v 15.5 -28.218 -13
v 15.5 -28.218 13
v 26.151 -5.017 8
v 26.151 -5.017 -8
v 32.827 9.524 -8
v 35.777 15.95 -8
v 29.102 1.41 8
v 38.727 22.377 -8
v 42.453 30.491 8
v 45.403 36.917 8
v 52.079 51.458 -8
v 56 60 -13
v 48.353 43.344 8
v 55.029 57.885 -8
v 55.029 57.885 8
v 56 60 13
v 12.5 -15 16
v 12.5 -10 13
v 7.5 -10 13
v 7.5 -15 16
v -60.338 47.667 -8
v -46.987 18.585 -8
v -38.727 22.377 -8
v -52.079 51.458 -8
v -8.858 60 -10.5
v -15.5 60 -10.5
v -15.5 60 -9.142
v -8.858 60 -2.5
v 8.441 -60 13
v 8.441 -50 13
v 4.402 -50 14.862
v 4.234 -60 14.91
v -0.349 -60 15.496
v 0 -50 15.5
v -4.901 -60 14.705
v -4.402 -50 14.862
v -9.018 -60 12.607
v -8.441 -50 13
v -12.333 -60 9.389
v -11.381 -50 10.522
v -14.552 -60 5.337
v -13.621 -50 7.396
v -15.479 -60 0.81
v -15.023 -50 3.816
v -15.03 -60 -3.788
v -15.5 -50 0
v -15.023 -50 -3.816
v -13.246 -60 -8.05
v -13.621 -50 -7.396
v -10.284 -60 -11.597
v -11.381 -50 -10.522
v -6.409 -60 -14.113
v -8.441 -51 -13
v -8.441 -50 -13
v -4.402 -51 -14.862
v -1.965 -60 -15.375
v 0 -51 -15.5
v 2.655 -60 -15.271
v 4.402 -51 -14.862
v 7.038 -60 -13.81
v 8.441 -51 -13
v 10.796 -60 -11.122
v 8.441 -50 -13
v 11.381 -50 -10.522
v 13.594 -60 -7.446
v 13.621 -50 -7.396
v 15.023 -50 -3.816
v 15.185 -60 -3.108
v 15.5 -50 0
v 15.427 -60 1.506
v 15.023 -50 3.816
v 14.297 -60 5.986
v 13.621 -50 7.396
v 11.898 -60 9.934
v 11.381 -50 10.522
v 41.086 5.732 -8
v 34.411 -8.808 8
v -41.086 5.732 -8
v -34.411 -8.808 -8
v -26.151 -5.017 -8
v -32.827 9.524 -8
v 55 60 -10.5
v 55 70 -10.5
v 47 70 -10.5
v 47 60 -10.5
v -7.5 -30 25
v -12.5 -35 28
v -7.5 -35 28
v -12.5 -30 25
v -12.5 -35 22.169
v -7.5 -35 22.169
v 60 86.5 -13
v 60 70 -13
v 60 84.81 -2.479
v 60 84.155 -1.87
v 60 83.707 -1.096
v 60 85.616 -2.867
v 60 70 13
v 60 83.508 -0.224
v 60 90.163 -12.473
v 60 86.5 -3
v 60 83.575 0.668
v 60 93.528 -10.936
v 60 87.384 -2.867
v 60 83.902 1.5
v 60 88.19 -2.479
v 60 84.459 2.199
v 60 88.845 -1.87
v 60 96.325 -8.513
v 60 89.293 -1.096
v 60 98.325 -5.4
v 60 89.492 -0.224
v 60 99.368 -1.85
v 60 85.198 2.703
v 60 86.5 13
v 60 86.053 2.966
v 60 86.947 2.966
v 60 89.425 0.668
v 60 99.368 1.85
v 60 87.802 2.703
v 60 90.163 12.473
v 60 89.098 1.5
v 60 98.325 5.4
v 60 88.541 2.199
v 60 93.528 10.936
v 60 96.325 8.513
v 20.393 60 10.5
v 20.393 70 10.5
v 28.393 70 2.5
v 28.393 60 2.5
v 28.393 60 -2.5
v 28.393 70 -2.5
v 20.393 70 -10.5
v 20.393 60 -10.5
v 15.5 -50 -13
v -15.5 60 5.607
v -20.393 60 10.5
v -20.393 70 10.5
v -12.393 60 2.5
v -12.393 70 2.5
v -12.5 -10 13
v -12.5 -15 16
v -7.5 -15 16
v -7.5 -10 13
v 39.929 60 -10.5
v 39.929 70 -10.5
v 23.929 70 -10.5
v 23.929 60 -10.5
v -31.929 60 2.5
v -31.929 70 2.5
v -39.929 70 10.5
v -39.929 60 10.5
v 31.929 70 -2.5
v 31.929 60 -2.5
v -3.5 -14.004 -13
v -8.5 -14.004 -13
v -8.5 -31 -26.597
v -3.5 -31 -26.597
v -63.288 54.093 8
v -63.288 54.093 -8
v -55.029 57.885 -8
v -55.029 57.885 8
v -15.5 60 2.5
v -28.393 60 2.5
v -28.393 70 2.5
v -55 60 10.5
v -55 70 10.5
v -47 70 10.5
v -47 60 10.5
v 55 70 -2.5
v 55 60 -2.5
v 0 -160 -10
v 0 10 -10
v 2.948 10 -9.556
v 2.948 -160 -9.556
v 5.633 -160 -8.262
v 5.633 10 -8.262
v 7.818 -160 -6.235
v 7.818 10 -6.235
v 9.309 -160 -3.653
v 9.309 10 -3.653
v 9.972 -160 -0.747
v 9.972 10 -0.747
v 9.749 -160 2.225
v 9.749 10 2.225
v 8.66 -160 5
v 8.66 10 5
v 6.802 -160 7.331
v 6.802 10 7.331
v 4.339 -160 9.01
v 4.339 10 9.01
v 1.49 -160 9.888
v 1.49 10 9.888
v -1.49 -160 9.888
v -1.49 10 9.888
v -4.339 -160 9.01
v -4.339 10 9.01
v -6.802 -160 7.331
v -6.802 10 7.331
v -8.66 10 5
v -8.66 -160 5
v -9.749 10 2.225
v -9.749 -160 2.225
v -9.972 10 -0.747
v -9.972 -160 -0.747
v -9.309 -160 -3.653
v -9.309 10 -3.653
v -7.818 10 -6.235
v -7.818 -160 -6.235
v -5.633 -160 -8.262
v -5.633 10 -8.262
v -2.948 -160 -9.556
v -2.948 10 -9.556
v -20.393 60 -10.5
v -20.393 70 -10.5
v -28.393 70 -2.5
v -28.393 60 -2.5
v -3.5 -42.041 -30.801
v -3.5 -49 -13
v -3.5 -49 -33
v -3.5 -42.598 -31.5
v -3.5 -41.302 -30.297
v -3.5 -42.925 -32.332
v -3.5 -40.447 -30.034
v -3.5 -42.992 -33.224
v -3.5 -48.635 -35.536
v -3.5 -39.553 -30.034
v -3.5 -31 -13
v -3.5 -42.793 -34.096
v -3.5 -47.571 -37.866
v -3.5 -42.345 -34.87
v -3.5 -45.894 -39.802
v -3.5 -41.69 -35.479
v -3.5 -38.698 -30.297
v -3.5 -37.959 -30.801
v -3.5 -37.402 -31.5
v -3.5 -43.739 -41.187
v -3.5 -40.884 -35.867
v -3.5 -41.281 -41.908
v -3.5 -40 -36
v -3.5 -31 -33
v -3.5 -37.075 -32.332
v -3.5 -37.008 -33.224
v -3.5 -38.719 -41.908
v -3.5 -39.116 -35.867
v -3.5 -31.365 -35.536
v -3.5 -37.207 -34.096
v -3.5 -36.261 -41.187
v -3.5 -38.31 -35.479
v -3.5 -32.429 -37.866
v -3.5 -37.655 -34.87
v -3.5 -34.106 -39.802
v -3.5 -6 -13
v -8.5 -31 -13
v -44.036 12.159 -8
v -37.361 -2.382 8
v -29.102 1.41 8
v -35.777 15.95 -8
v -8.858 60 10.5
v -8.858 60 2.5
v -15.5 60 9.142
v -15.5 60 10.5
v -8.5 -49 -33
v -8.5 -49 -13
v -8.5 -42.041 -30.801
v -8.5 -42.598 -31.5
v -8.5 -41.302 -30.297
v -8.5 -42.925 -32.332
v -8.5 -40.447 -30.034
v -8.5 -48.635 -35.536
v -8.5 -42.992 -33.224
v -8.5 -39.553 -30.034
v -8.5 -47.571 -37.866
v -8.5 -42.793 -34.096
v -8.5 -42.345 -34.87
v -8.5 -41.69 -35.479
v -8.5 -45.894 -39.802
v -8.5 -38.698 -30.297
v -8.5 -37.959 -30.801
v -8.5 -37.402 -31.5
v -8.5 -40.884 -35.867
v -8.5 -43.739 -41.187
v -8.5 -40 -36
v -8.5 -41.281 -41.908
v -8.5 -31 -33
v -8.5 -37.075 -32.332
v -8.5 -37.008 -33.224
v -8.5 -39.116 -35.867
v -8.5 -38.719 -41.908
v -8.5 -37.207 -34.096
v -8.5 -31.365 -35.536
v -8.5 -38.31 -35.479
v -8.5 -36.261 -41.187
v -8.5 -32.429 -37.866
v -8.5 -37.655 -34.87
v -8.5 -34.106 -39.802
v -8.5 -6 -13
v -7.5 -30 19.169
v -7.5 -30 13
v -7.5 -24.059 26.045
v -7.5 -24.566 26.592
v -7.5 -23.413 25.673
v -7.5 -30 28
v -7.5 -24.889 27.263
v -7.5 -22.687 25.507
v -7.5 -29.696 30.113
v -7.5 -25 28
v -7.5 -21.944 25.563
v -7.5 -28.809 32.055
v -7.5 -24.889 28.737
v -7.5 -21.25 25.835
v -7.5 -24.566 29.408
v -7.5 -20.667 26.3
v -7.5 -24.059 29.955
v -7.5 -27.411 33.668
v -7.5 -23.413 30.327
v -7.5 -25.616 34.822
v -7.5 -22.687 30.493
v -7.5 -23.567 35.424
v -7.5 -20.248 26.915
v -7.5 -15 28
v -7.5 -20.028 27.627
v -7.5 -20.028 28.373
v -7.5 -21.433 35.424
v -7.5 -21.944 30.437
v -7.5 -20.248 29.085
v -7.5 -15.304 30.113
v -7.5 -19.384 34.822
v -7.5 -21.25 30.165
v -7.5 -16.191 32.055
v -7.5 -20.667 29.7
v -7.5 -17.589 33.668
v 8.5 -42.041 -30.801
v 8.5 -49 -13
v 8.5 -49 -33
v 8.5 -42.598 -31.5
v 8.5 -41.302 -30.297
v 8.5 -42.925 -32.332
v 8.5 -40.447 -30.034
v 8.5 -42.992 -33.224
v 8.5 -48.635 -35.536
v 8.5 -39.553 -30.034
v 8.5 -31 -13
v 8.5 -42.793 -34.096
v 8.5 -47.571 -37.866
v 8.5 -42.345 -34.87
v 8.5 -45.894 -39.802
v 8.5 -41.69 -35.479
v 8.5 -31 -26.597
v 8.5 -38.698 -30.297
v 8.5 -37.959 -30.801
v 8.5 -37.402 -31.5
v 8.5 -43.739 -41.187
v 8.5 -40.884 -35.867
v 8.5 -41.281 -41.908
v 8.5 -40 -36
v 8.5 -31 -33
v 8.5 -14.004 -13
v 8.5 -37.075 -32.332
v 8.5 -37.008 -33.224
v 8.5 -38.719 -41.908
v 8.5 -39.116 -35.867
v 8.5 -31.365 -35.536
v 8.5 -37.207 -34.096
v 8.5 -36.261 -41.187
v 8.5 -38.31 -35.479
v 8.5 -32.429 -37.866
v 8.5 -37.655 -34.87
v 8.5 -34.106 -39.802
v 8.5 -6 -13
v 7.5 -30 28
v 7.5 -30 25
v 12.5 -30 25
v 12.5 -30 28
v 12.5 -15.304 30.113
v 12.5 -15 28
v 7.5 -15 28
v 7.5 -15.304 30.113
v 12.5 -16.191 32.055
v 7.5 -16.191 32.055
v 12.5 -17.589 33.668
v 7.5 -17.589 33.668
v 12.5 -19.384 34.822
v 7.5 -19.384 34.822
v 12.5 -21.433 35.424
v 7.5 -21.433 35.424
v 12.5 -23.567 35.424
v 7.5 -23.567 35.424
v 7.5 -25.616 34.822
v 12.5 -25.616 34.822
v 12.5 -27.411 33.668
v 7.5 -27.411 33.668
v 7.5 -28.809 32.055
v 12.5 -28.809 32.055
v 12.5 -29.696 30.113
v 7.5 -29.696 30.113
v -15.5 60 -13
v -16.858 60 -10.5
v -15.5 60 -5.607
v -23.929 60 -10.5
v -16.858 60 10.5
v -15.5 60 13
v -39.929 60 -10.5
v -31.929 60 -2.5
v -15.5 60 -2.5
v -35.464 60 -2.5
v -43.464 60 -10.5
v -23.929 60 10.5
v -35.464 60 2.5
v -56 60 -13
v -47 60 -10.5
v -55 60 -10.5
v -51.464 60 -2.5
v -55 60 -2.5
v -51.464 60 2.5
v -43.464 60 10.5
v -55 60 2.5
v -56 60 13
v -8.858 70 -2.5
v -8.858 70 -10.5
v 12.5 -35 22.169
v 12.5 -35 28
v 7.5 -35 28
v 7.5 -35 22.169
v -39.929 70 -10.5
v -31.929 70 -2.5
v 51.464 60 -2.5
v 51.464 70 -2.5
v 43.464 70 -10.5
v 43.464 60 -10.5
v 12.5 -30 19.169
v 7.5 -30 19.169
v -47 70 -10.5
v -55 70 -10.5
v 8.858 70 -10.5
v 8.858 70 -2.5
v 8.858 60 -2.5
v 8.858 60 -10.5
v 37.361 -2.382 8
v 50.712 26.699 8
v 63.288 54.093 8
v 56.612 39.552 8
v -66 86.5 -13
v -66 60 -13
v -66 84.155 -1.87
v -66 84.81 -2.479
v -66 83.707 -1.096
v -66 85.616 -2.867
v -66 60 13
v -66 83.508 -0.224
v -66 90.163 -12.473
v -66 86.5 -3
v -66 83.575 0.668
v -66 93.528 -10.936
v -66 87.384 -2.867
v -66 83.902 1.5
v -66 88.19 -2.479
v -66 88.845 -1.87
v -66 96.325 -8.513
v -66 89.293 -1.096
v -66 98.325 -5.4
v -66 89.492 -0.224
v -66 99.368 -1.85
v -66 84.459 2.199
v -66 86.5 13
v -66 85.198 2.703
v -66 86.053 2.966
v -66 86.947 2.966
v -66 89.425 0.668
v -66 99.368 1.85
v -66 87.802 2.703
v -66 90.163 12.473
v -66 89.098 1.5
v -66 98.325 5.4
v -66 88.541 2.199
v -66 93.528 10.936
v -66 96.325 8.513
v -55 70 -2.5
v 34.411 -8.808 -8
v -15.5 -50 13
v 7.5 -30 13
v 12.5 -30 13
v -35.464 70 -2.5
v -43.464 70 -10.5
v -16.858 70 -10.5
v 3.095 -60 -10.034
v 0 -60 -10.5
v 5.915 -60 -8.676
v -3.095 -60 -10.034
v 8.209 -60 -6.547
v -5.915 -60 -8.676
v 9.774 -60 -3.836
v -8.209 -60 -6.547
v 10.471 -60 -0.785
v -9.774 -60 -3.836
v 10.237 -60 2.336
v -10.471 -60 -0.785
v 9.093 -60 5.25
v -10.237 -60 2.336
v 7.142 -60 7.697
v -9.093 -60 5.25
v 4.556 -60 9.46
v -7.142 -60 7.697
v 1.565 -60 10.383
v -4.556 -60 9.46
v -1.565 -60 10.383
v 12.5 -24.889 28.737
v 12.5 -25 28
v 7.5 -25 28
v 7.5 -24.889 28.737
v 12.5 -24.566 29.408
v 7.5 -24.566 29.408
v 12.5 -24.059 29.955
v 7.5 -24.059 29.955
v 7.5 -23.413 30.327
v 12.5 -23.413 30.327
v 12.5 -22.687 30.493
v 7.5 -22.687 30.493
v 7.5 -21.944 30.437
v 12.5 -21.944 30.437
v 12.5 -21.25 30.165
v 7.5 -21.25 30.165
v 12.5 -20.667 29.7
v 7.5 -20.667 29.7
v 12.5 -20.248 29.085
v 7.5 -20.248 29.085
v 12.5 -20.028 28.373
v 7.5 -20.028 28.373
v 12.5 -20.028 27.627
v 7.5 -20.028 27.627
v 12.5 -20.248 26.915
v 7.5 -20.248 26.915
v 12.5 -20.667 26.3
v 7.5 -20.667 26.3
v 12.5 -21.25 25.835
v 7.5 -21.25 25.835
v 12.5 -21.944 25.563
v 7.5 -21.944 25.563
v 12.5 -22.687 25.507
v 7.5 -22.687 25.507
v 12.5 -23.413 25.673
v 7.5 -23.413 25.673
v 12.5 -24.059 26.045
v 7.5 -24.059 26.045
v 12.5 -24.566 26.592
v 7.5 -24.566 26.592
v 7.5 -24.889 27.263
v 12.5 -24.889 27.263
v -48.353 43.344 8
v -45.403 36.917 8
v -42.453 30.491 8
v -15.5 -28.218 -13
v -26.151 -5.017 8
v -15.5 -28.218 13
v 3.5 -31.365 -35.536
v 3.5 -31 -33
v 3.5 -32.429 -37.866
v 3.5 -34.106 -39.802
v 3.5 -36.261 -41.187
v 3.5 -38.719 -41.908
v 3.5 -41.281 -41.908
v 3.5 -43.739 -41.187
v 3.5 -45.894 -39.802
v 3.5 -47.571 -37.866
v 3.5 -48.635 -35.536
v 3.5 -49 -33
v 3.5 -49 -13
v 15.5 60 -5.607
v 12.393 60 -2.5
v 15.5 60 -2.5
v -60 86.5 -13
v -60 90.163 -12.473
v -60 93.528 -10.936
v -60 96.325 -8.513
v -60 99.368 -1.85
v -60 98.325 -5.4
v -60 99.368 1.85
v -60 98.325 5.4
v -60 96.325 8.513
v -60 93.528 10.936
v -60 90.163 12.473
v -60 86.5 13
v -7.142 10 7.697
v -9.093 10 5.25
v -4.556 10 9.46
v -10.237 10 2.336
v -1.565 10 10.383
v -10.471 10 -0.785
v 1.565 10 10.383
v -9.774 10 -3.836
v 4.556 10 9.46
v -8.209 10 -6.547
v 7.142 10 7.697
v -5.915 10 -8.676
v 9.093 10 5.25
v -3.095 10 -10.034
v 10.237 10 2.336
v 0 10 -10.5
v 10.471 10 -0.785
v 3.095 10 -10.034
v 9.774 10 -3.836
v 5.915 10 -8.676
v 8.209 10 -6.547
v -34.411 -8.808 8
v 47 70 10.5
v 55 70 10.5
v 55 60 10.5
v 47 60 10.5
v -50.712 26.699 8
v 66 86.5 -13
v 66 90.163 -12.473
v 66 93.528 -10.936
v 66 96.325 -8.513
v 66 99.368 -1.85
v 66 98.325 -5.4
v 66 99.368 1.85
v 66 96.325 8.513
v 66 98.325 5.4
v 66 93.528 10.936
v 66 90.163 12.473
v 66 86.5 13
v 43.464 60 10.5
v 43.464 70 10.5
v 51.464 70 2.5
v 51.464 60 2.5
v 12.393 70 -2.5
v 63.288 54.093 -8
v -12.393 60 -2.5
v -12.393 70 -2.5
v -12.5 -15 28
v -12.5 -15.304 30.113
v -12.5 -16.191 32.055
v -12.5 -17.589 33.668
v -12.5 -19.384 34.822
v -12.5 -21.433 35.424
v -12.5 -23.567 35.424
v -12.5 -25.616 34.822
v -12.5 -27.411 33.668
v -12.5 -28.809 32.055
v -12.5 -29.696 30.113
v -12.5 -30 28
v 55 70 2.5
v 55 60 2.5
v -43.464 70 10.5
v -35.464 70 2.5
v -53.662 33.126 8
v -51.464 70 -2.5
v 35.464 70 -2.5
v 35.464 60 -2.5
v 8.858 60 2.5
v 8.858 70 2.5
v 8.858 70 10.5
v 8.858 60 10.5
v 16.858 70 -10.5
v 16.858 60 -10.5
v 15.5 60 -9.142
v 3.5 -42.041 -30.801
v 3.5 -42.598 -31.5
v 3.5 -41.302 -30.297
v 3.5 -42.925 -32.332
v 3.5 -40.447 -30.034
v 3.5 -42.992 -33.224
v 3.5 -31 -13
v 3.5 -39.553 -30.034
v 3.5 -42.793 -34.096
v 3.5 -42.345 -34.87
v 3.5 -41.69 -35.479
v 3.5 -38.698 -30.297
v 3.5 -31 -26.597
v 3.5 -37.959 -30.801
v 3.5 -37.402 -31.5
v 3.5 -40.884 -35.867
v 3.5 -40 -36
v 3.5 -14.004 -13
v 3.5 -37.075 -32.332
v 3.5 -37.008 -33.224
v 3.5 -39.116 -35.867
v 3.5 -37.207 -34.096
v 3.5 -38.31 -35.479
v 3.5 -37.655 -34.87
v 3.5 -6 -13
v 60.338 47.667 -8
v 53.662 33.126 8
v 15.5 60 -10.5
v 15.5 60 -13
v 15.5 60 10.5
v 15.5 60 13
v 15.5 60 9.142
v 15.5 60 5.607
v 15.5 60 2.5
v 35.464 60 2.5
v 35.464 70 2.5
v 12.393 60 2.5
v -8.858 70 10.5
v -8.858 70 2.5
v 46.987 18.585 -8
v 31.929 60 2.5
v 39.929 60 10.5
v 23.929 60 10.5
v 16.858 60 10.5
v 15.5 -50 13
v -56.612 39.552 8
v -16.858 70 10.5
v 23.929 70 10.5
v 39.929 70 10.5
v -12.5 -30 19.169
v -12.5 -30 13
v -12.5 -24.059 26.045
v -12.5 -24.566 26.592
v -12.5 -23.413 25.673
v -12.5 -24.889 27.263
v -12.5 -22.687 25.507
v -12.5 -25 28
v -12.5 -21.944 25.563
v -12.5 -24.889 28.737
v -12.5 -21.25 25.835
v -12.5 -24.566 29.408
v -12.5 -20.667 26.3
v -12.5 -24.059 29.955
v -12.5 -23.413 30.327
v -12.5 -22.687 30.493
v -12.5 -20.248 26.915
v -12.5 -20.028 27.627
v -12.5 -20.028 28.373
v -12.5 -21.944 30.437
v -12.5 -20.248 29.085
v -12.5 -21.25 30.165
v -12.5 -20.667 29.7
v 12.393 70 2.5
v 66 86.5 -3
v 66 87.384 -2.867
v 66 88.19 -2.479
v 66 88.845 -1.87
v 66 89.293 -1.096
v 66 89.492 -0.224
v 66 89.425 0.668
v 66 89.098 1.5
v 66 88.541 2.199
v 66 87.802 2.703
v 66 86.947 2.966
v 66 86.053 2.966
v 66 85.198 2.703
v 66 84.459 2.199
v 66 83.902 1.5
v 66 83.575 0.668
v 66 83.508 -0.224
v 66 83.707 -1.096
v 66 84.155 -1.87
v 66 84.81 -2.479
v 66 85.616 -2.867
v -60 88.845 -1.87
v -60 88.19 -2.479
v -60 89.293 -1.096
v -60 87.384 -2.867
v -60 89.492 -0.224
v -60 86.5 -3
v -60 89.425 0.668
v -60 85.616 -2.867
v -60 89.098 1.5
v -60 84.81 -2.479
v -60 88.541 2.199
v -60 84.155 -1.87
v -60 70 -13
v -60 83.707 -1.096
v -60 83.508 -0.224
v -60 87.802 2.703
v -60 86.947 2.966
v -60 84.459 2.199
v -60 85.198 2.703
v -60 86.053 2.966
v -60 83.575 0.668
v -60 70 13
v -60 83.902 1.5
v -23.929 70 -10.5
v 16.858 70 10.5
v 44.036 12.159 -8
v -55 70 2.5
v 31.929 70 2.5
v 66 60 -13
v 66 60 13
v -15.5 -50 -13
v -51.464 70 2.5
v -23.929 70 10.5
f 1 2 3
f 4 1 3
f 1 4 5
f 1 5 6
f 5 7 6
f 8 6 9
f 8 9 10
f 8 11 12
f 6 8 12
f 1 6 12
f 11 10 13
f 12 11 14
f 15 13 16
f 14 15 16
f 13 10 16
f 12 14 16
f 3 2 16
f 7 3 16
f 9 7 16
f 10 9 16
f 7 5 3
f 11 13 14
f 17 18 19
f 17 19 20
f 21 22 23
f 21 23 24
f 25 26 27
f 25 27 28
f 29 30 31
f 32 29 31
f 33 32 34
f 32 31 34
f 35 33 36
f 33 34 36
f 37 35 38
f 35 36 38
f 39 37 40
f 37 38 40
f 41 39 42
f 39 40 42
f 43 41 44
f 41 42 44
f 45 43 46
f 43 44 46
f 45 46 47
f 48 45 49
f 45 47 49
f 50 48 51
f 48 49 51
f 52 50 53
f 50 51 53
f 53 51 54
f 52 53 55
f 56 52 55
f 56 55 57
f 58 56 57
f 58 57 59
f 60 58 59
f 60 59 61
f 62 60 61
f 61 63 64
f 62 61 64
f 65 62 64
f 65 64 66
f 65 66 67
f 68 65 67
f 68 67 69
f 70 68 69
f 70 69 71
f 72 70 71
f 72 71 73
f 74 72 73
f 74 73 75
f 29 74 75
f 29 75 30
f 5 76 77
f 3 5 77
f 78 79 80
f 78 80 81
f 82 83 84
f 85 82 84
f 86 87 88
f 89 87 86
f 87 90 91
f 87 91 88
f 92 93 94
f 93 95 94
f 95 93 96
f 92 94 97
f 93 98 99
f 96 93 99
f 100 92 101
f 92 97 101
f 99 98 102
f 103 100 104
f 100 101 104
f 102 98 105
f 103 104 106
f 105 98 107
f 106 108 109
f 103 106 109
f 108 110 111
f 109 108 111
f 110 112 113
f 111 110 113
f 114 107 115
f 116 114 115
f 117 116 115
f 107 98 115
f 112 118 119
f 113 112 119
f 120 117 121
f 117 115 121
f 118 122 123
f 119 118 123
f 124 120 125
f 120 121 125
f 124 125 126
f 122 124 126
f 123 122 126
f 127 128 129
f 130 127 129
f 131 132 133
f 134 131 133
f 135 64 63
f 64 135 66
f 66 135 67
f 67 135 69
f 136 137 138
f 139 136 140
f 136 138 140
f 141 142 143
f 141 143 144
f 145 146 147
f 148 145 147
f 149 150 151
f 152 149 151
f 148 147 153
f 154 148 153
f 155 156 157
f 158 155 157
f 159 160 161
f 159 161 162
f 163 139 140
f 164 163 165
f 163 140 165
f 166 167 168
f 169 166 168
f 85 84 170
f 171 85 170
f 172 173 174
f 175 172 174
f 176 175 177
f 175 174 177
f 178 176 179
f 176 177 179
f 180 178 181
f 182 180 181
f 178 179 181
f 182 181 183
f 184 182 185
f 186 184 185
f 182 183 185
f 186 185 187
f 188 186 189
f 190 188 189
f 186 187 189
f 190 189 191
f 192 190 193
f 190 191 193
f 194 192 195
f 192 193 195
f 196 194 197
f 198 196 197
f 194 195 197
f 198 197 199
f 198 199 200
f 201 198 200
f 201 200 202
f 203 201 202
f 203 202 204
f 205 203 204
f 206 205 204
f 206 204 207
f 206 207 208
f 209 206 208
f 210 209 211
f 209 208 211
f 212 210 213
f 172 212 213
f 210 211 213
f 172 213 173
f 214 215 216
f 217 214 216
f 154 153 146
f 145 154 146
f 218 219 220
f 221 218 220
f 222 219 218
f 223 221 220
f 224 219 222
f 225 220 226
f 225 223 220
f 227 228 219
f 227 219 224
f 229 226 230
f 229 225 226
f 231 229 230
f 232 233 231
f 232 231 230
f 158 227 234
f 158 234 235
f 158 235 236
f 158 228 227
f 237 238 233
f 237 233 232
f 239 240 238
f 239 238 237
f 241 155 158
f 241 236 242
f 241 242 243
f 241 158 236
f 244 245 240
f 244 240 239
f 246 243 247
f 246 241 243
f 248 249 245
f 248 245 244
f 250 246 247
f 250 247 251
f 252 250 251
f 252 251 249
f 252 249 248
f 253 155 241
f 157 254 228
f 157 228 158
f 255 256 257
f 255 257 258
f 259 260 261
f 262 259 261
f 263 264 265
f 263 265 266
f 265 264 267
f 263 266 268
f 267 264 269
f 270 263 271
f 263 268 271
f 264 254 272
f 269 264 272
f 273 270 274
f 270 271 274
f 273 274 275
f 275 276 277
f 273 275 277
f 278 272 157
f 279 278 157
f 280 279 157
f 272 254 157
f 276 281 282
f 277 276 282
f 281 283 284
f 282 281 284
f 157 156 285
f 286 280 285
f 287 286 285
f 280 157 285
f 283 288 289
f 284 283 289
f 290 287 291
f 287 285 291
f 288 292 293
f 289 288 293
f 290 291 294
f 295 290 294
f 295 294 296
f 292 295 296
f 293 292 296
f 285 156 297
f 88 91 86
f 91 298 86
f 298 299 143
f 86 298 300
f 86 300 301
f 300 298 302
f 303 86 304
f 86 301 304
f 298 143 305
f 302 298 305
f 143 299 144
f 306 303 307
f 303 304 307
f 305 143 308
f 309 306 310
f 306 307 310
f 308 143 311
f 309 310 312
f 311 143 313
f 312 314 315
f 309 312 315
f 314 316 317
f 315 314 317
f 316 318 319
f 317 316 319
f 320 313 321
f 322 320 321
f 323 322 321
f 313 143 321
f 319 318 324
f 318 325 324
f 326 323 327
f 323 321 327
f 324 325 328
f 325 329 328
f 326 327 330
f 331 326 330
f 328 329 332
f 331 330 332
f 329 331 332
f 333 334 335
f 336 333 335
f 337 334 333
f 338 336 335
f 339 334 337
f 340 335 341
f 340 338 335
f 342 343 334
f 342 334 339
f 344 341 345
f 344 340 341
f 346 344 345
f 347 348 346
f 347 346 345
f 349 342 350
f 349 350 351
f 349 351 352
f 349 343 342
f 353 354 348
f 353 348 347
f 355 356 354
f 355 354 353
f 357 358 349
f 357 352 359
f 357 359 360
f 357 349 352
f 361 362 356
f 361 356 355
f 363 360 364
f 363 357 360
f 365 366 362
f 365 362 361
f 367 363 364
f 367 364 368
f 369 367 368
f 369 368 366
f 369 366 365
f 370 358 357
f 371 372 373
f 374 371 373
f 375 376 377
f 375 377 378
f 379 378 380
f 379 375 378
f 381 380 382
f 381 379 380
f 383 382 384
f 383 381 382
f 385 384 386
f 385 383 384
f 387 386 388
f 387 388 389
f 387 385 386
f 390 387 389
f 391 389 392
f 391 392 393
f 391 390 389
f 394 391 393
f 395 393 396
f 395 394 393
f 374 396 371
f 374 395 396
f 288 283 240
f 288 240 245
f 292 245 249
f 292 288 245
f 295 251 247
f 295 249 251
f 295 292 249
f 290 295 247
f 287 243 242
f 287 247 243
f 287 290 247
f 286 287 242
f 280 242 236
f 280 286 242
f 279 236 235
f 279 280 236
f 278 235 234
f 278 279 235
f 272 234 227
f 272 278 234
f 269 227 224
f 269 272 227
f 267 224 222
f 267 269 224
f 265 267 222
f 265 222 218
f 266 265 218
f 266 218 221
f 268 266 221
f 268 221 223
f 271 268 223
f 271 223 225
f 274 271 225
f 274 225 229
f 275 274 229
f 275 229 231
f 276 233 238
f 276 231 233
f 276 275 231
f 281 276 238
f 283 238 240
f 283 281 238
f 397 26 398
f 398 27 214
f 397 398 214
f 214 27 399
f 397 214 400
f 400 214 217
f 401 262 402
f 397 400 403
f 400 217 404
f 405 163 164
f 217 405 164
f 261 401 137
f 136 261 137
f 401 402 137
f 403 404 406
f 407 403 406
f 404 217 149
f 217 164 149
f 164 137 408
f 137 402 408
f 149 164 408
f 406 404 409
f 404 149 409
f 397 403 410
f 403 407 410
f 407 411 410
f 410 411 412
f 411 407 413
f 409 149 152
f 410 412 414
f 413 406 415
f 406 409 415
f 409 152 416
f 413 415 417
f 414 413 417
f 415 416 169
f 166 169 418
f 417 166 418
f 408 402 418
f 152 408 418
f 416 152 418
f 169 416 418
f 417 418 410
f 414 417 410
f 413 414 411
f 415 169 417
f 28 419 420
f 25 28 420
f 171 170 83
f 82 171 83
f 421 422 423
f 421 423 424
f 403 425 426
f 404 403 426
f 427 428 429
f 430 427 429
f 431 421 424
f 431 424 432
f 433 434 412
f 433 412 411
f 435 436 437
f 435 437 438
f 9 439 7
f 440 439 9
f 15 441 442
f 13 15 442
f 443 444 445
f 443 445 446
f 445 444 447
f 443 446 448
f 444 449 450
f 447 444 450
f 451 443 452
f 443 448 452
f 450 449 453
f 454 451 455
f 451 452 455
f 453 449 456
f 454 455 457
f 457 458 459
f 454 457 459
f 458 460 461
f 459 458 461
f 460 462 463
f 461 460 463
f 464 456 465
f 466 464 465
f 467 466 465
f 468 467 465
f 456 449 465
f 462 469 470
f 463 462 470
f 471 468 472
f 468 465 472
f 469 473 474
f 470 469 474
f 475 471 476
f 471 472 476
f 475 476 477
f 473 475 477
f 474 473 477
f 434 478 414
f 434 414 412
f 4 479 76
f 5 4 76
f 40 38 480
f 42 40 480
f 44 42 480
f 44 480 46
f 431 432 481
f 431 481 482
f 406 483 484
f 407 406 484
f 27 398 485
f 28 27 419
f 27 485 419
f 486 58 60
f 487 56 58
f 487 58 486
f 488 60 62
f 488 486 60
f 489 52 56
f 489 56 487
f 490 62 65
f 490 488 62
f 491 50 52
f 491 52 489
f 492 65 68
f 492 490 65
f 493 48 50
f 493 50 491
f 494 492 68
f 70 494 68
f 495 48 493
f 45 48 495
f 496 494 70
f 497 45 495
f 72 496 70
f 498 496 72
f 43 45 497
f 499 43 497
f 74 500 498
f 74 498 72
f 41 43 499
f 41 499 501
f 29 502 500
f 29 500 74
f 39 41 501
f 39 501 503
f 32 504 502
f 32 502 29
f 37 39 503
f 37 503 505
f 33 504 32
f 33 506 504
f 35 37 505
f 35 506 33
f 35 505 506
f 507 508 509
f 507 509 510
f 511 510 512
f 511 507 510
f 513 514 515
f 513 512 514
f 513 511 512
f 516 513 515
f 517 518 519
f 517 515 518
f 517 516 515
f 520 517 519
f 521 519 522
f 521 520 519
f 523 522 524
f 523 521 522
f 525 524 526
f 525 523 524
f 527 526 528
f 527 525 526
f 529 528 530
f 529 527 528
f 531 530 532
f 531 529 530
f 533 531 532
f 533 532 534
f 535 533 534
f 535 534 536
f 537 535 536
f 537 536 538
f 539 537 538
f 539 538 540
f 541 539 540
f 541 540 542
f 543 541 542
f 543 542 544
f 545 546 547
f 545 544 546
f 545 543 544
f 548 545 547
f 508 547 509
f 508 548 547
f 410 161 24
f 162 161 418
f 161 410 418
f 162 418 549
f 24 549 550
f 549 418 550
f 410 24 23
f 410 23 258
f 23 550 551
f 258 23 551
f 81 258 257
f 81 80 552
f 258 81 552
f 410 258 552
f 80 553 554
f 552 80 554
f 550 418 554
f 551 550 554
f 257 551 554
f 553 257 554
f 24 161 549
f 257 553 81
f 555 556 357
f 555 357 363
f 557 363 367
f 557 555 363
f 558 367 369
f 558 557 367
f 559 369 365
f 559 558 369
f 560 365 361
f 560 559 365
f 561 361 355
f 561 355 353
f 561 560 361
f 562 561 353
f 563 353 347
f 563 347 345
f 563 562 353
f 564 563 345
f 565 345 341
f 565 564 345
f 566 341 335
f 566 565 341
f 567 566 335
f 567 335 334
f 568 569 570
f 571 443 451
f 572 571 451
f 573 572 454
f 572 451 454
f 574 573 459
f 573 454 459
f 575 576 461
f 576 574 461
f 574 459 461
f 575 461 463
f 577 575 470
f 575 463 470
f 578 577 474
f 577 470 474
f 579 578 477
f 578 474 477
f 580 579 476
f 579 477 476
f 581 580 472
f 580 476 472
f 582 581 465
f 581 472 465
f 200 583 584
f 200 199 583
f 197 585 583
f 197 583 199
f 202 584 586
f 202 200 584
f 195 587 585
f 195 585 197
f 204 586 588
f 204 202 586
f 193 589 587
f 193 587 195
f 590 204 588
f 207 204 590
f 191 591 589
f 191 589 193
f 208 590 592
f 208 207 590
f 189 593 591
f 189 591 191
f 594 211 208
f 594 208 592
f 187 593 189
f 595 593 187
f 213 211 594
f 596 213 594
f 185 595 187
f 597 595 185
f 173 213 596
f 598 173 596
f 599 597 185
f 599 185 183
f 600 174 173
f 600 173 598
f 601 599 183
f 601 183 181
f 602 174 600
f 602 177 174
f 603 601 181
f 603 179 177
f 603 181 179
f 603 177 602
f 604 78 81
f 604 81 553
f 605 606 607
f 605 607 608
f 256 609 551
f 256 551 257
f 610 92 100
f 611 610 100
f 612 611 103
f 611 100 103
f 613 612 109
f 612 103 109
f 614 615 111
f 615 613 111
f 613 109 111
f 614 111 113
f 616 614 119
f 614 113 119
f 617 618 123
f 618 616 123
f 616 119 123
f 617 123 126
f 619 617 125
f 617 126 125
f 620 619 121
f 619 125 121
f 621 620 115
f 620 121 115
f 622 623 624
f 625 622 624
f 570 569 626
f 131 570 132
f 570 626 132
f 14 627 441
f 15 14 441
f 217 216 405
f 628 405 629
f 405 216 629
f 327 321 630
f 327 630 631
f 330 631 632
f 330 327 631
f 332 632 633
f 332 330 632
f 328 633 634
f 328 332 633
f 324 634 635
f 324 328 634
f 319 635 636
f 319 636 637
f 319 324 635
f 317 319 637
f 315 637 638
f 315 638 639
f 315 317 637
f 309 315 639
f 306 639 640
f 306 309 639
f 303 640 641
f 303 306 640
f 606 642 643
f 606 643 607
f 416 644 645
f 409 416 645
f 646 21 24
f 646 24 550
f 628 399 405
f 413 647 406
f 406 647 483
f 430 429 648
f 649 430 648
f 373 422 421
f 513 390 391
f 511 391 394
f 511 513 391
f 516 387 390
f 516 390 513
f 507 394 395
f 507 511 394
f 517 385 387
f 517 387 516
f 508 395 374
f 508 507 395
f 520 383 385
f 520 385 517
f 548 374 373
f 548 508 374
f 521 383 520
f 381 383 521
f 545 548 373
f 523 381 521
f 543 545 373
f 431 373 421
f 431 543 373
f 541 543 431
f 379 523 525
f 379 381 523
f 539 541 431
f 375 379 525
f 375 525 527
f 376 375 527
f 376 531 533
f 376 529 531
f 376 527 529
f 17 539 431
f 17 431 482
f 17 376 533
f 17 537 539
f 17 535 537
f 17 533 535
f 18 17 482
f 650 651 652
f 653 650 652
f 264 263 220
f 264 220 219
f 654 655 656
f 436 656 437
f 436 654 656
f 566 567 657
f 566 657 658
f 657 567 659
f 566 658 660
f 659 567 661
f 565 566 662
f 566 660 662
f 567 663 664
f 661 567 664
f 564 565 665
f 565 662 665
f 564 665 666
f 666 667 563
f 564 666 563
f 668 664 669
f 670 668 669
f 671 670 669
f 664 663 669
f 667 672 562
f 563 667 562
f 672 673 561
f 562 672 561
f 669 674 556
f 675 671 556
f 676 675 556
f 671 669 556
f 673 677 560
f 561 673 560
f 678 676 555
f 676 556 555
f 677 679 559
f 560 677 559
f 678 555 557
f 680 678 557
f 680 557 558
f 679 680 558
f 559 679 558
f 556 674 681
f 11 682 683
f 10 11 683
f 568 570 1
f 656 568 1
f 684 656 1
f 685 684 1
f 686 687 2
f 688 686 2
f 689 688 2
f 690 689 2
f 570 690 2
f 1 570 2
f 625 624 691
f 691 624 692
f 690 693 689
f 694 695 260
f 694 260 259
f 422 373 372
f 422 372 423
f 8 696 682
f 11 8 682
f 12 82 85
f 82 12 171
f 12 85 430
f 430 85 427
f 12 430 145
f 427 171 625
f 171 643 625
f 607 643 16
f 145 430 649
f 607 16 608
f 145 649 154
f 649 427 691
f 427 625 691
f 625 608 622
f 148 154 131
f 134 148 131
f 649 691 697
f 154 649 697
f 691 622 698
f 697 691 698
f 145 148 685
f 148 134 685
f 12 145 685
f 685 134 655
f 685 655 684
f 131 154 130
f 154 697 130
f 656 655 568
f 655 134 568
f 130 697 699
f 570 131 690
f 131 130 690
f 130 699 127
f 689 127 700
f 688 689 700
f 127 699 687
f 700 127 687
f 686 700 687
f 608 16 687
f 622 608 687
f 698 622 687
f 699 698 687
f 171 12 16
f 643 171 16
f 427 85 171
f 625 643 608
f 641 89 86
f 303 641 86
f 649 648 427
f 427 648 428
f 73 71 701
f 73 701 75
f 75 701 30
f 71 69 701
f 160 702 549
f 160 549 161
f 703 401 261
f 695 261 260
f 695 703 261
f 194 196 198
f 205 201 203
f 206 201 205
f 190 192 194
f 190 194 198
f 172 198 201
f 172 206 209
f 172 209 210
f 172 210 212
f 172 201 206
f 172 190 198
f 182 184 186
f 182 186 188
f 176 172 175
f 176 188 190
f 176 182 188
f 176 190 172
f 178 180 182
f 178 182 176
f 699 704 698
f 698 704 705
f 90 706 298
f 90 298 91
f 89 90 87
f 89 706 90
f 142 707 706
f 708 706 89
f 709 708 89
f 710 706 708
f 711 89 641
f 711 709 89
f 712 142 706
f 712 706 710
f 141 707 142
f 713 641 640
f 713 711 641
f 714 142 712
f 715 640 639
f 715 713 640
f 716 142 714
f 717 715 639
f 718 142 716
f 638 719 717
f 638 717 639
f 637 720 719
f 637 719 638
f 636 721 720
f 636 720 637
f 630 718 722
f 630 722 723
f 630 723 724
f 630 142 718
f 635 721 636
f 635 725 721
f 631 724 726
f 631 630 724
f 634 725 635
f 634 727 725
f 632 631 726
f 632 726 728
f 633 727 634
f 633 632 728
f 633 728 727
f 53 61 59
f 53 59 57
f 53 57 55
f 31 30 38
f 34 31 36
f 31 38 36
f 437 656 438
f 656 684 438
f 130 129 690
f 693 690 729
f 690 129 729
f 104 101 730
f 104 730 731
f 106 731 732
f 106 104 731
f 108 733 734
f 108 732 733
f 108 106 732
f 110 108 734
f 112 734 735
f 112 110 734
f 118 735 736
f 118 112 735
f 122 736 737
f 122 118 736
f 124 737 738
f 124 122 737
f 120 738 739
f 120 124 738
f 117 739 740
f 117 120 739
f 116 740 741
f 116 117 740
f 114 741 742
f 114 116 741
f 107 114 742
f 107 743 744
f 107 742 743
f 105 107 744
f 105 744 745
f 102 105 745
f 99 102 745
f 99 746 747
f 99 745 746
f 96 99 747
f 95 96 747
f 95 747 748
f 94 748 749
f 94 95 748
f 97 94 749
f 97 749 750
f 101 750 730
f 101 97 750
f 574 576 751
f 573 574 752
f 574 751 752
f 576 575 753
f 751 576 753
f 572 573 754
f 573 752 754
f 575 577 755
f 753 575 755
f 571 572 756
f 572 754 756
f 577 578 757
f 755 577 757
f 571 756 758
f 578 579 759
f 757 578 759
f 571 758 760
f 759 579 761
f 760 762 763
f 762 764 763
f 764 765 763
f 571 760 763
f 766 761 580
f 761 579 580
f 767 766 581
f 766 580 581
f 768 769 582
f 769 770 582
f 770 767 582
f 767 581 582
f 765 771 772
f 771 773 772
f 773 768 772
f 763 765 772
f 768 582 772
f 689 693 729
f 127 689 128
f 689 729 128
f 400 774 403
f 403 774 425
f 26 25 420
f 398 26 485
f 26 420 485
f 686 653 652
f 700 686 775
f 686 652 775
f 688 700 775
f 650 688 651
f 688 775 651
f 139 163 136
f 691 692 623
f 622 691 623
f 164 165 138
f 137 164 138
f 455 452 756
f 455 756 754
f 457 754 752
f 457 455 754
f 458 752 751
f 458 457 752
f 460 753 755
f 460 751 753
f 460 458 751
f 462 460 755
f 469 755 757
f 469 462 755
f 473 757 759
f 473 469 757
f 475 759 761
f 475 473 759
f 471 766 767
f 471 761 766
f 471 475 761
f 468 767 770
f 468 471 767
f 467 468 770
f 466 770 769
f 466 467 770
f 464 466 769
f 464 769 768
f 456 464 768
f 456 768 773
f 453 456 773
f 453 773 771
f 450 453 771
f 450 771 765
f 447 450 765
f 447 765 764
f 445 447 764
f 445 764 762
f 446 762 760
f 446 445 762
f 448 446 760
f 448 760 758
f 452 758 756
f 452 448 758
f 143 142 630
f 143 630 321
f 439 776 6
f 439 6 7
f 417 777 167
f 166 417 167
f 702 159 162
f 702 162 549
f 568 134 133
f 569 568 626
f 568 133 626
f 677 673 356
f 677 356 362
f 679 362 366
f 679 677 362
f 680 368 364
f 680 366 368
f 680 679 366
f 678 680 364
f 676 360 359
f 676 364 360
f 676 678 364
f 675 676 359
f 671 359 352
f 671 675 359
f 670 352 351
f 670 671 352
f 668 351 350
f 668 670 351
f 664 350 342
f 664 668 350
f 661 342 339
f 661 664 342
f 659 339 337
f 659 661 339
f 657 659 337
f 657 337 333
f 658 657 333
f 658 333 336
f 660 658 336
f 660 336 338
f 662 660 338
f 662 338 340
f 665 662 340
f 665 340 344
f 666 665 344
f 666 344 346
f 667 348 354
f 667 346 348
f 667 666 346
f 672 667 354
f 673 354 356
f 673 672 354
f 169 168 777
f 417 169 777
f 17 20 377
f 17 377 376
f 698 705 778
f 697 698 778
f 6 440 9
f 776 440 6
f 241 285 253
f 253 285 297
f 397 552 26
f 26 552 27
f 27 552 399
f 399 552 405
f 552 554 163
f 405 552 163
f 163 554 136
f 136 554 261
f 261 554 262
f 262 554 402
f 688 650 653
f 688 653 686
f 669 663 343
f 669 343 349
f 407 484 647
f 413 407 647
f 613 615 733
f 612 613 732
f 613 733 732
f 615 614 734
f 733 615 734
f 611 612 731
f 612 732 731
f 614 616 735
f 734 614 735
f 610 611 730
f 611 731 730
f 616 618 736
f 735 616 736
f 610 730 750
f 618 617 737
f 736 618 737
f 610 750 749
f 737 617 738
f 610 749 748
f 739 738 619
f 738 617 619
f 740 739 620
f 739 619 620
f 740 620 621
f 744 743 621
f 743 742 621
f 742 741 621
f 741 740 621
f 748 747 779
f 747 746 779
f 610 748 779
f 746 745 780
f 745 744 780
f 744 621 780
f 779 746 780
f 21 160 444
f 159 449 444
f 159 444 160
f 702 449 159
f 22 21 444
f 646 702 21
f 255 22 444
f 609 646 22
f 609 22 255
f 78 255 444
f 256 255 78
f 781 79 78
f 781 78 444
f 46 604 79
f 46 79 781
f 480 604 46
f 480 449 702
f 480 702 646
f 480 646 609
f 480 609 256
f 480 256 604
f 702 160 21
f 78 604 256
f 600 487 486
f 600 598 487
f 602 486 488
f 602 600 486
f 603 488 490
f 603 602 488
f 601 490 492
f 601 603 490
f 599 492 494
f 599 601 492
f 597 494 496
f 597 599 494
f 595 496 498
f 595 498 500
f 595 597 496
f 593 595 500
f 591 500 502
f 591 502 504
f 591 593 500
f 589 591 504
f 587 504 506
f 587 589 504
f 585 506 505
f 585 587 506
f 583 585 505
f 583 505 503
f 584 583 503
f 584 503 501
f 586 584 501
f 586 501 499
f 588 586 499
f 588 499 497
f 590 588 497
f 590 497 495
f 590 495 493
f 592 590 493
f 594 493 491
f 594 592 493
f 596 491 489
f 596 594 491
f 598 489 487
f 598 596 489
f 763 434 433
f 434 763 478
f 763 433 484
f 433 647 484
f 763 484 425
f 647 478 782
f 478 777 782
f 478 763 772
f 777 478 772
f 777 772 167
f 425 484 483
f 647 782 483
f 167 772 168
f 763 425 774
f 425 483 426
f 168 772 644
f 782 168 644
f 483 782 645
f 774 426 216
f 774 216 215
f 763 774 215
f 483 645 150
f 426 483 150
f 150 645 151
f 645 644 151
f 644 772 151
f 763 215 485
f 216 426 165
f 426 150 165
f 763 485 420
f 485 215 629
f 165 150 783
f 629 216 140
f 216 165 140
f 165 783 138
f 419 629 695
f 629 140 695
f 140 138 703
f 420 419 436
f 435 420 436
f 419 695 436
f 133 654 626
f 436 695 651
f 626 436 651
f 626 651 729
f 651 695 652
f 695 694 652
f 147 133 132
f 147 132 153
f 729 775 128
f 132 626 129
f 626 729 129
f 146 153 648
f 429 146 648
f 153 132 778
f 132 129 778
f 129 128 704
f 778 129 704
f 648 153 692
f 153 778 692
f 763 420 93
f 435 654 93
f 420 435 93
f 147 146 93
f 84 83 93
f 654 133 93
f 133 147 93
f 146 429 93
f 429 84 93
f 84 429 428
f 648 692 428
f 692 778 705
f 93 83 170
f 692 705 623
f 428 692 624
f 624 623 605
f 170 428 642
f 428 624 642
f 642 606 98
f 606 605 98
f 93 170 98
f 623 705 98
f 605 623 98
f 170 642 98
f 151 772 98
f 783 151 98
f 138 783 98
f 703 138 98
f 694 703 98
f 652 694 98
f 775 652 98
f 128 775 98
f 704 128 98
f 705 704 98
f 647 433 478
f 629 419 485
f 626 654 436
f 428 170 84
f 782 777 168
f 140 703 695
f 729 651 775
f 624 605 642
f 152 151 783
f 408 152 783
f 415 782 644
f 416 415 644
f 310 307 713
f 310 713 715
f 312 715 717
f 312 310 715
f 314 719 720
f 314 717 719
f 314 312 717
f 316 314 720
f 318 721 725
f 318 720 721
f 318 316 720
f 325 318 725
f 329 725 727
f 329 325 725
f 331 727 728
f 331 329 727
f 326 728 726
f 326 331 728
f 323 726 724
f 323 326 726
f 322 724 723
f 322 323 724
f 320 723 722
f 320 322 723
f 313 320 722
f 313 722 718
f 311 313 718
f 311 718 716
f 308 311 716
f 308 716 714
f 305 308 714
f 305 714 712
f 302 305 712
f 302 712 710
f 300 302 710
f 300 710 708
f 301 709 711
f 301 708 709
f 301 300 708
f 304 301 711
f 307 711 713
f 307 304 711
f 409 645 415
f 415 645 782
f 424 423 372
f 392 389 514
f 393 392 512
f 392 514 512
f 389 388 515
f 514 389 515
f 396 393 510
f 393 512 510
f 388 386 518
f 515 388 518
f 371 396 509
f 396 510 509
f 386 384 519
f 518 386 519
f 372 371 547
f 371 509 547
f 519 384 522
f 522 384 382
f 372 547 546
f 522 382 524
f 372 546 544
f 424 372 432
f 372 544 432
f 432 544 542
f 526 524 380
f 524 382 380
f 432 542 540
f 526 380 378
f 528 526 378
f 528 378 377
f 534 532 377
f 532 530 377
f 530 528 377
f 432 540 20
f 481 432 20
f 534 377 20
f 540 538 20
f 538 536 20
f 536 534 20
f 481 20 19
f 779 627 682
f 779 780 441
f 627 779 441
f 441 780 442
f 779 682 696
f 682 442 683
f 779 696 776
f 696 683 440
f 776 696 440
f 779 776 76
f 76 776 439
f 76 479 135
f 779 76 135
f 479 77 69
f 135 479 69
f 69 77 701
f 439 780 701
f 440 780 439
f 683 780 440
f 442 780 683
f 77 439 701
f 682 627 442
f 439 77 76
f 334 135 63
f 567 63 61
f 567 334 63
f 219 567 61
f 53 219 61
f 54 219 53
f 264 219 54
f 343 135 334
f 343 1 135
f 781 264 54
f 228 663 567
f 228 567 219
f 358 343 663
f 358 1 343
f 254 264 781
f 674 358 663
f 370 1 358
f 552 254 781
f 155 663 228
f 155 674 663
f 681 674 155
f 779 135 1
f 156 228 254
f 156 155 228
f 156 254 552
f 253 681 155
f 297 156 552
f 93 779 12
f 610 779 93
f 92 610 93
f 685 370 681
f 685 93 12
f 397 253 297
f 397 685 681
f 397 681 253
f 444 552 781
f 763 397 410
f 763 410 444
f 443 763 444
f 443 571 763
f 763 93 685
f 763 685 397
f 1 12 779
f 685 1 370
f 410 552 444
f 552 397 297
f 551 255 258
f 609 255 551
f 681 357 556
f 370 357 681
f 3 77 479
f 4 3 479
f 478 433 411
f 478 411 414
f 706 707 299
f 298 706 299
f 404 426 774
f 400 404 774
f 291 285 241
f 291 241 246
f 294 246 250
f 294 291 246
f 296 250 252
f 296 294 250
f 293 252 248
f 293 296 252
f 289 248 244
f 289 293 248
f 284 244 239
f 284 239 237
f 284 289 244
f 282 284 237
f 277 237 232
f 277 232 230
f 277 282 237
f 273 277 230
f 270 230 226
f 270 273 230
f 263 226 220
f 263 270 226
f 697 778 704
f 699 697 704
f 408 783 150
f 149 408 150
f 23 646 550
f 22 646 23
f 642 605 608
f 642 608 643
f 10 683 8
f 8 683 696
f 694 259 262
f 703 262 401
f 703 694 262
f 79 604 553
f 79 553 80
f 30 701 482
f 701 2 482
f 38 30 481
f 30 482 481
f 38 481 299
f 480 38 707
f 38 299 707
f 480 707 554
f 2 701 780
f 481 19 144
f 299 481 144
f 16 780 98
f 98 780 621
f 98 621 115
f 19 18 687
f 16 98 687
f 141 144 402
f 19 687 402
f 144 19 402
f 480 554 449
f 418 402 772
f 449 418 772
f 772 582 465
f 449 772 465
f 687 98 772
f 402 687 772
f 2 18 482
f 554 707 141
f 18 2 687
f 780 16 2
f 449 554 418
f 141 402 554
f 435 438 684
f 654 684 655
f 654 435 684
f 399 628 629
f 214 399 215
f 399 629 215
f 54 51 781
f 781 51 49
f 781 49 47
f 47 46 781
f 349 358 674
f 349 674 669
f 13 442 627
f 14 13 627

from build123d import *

# Parameters (mm, degrees)
TYKKELSE_LEDDFESTER_OG_BREDDE_H_YDE_SELV_DEPTH = 13
SKETCH28_R                                     = 15.5
SKETCH28_R_2                                   = 10.5
HULL_TIL_L_RBEN_KARBONFIBERR_R_DEPTH           = 10
SKRUEHULL_LEDDFESTER_DEPTH                     = 167.325734629
SKRUEHULL_LEDDFESTER_DEPTH_BACK                = 167.325734629
SKETCH29_R                                     = 3
SKETCH33_W                                     = 5
SKETCH33_H                                     = 20
BREDDE_OG_AVSTAND_STEMPELENDE_DEPTH            = 60
CUT_EXTRUDE4_DEPTH                             = 148.147035308
SIDEM_NSTER_DEPTH                              = 9.088039
SIDEM_NSTER_2_DEPTH                            = 9.088039
UTVIDET_START                                  = -60
SKETCH44_R                                     = 10.5
UTVIDET_L_RBENHULL_INN_I_SELVE_KROPPEN_DEPTH   = 60
M_NSTER_TOPP_DEPTH                             = 10
STEMPELENDE_AV_ST_RSTE_SYLINDER_DEPTH          = 145.150962536
STEMPELENDE_AV_ST_RSTE_SYLINDER_DEPTH_BACK     = 145.150962536
ROD_ENDE_JUSTERE_LENGDEN_ALTS_FESTE_T_R        = 3
SKETCH39_W                                     = 5
SKETCH39_H                                     = 15
SYLINDERFESTE_SELVE_DEN_LILLE_SYLINDERE_DEPTH  = 25
ST_TTER_ST_RSTE_SYLINDER_1_DEPTH               = 5
ST_TTER_ST_RSTE_SYLINDER_2_DEPTH               = 5
SYLINDERFESTE_LITEN_SYLINDER_DEPTH             = 134.515916654
SYLINDERFESTE_LITEN_SYLINDER_DEPTH_BACK        = 134.515916654
SKETCH48_R                                     = 2.5
BOSS_EXTRUDE11_DEPTH                           = 5
BOSS_EXTRUDE12_DEPTH                           = 5
SKETCH51_R                                     = 10
TIL_ASSEMBLY_SLETT_F_R_PRINTING_DEPTH          = 170


with BuildPart() as part:
    # Sketch27 → Tykkelse leddfester og bredde/høyde selve modellen (new, symmetric)
    with BuildSketch(Plane.XY):
        Polygon((66, -50), (-66, -50), (-66, 100), (-60, 100), (-60, 70), (60, 70), (60, 100), (66, 100), align=None)
    extrude(amount=TYKKELSE_LEDDFESTER_OG_BREDDE_H_YDE_SELV_DEPTH, both=True)

    # Sketch28 → Hull til lårben/karbonfiberrør (add)
    with BuildSketch(Plane.XZ.offset(50)):
        with Locations(Location((0, 0, 0), (0, 0, 57.004114526))):
            Circle(SKETCH28_R)
        with Locations(Location((0, 0, 0), (0, 0, 270))):
            Circle(SKETCH28_R_2, mode=Mode.SUBTRACT)
    extrude(amount=HULL_TIL_L_RBEN_KARBONFIBERR_R_DEPTH)

    # Sketch29 → Skruehull leddfester (cut, two sides: drawn at the far end of the back side and taken through both)
    with BuildSketch(Plane(origin=(66, 0, 0), x_dir=(0, 0, -1), z_dir=(1, 0, 0)).offset(-SKRUEHULL_LEDDFESTER_DEPTH_BACK)):
        with Locations((0, 86.5)):
            Circle(SKETCH29_R)
        with BuildLine():
            Line((-13, 86.5), (-13, 71.5))
            Line((-13, 71.5), (-14, 71.5))
            Line((-14, 71.5), (-14, 101))
            Line((-14, 101), (0, 101))
            Line((0, 101), (14, 101))
            Line((14, 101), (14, 71.5))
            Line((14, 71.5), (13, 71.5))
            Line((13, 71.5), (13, 86.5))
            ThreePointArc((13, 86.5), (0, 99.5), (-13, 86.5))
        make_face()
    extrude(amount=SKRUEHULL_LEDDFESTER_DEPTH + SKRUEHULL_LEDDFESTER_DEPTH_BACK, mode=Mode.SUBTRACT)

    # Sketch33 → Bredde og avstand stempelende (add)
    with BuildSketch(Plane(origin=(0, 0, -13), x_dir=(-1, 0, 0), z_dir=(0, 0, -1))):
        with Locations((-6, -40)):
            Rectangle(SKETCH33_W, SKETCH33_H)
        with Locations((6, -40)):
            Rectangle(SKETCH33_W, SKETCH33_H)
    extrude(amount=BREDDE_OG_AVSTAND_STEMPELENDE_DEPTH)

    # Fasong (mønster på selve kroppen) → Cut-Extrude4 (cut, through all)
    with BuildSketch(Plane.XY.offset(13)):
        Polygon((-66, 60), (-15.5, -50), (-66, -50), align=None)
        Polygon((15.5, -50), (66, -50), (66, 60), align=None)
        Polygon((-56, 60), (-15.5, -28.217821782), (-15.5, 60), align=None)
        Polygon((56, 60), (15.5, 60), (15.5, -28.217821782), align=None)
    extrude(amount=-CUT_EXTRUDE4_DEPTH, mode=Mode.SUBTRACT)

    # Sketch40 → Sidemønster (cut)
    with BuildSketch(Plane(origin=(-31.760550161, -14.580979847, 0), x_dir=(0, 0, 1), z_dir=(-0.9088038689830882, -0.41722359439678147, 0))):
        Polygon((-8, 75.564989369), (8, 75.564989369), (8, 59.564989369), align=None)
        Polygon((-8, 68.493921557), (8, 52.493921557), (-8, 36.493921557), align=None)
        Polygon((8, 13.422853745), (-8, 29.422853745), (8, 45.422853745), align=None)
        Polygon((-8, 22.351785934), (8, 6.351785934), (-8, 6.351785934), align=None)
    extrude(amount=-SIDEM_NSTER_DEPTH, mode=Mode.SUBTRACT)

    # Sketch42 → Sidemønster 2 (cut)
    with BuildSketch(Plane(origin=(31.760550161, -14.580979847, 0), x_dir=(0, 0, -1), z_dir=(0.9088038689830882, -0.41722359439678147, 0))):
        Polygon((8, 75.564989369), (-8, 75.564989369), (-8, 59.564989369), align=None)
        Polygon((8, 68.493921557), (-8, 52.493921557), (8, 36.493921557), align=None)
        Polygon((-8, 45.422853745), (8, 29.422853745), (-8, 13.422853745), align=None)
        Polygon((8, 22.351785934), (-8, 6.351785934), (8, 6.351785934), align=None)
    extrude(amount=-SIDEM_NSTER_2_DEPTH, mode=Mode.SUBTRACT)

    # Sketch44 → Utvidet lårbenhull inn i selve kroppen (cut)
    with BuildSketch(Plane.XZ.offset(50).offset(UTVIDET_START)):
        with Locations(Location((0, 0, 0), (0, 0, 270))):
            Circle(SKETCH44_R)
    extrude(amount=UTVIDET_L_RBENHULL_INN_I_SELVE_KROPPEN_DEPTH, mode=Mode.SUBTRACT)

    # Sketch45 → Mønster topp (cut)
    with BuildSketch(Plane(origin=(0, 70, 0), x_dir=(1, 0, 0), z_dir=(0, 1, 0))):
        Polygon((-39.928932188, 10.5), (-31.928932188, 2.5), (-23.928932188, 10.5), align=None)
        Polygon((-16.857864376, 10.5), (-8.857864376, 2.5), (-8.857864376, 10.5), align=None)
        Polygon((-55, 2.5), (-55, 10.5), (-47, 10.5), align=None)
        Polygon((-43.464466094, 10.5), (-51.464466094, 2.5), (-35.464466094, 2.5), align=None)
        Polygon((-20.393398282, 10.5), (-28.393398282, 2.5), (-12.393398282, 2.5), align=None)
        Polygon((-8.857864376, -2.5), (-8.857864376, -10.5), (-16.857864376, -10.5), align=None)
        Polygon((-20.393398282, -10.5), (-12.393398282, -2.5), (-28.393398282, -2.5), align=None)
        Polygon((-23.928932188, -10.5), (-31.928932188, -2.5), (-39.928932188, -10.5), align=None)
        Polygon((-43.464466094, -10.5), (-35.464466094, -2.5), (-51.464466094, -2.5), align=None)
        Polygon((-55, -10.5), (-47, -10.5), (-55, -2.5), align=None)
        Polygon((8.857864376, 2.5), (8.857864376, 10.5), (16.857864376, 10.5), align=None)
        Polygon((16.857864376, -10.5), (8.857864376, -2.5), (8.857864376, -10.5), align=None)
        Polygon((20.393398282, -10.5), (28.393398282, -2.5), (12.393398282, -2.5), align=None)
        Polygon((20.393398282, 10.5), (12.393398282, 2.5), (28.393398282, 2.5), align=None)
        Polygon((23.928932188, 10.5), (31.928932188, 2.5), (39.928932188, 10.5), align=None)
        Polygon((23.928932188, -10.5), (39.928932188, -10.5), (31.928932188, -2.5), align=None)
        Polygon((43.464466094, -10.5), (51.464466094, -2.5), (35.464466094, -2.5), align=None)
        Polygon((55, -2.5), (55, -10.5), (47, -10.5), align=None)
        Polygon((43.464466094, 10.5), (35.464466094, 2.5), (51.464466094, 2.5), align=None)
        Polygon((55, 10.5), (47, 10.5), (55, 2.5), align=None)
    extrude(amount=-M_NSTER_TOPP_DEPTH, mode=Mode.SUBTRACT)

    # Rod-ende, justere lengden (altså feste til største sylinder) → Stempelende av st_rste sylinder (cut, two sides: drawn at the far end of the back side and taken through both)
    with BuildSketch(Plane(origin=(8.5, 0, 0), x_dir=(0, 0, -1), z_dir=(1, 0, 0)).offset(-STEMPELENDE_AV_ST_RSTE_SYLINDER_DEPTH_BACK)):
        with Locations((33, -40)):
            Circle(ROD_ENDE_JUSTERE_LENGDEN_ALTS_FESTE_T_R)
        with BuildLine():
            Line((43, -51), (74, -51))
            Line((74, -51), (74, -29))
            Line((74, -29), (43, -29))
            Line((43, -29), (13, -29))
            Line((13, -29), (13, -31))
            Line((13, -31), (33, -31))
            ThreePointArc((33, -31), (42, -40), (33, -49))
            Line((33, -49), (13, -49))
            Line((13, -49), (13, -51))
            Line((13, -51), (43, -51))
        make_face()
    extrude(amount=STEMPELENDE_AV_ST_RSTE_SYLINDER_DEPTH + STEMPELENDE_AV_ST_RSTE_SYLINDER_DEPTH_BACK, mode=Mode.SUBTRACT)

    # Sketch39 → Sylinderfeste_ selve den lille sylindere (add)
    with BuildSketch(Plane.XY.offset(13)):
        with Locations((-10, -22.5)):
            Rectangle(SKETCH39_W, SKETCH39_H)
        with Locations((10, -22.5)):
            Rectangle(SKETCH39_W, SKETCH39_H)
    extrude(amount=SYLINDERFESTE_SELVE_DEN_LILLE_SYLINDERE_DEPTH)

    # Sketch46 → Støtter største sylinder 1 (add)
    with BuildSketch(Plane(origin=(8.5, 0, 0), x_dir=(0, 0, -1), z_dir=(1, 0, 0))):
        Polygon((13, -6), (13, -14.003905297), (26.596875763, -31), (33, -31), align=None)
    extrude(amount=-ST_TTER_ST_RSTE_SYLINDER_1_DEPTH)

    # Sketch47 → Støtter største sylinder 2 (add)
    with BuildSketch(Plane.ZY.offset(8.5)):
        Polygon((-33, -31), (-13, -6), (-13, -14.003905297), (-26.596875763, -31), align=None)
    extrude(amount=-ST_TTER_ST_RSTE_SYLINDER_2_DEPTH)

    # Sketch48 → Sylinderfeste, liten sylinder (cut, two sides: drawn at the far end of the back side and taken through both)
    with BuildSketch(Plane.ZY.offset(12.5).offset(-SYLINDERFESTE_LITEN_SYLINDER_DEPTH_BACK)):
        with Locations(Location((28, -22.5, 0), (0, 0, 270))):
            Circle(SKETCH48_R)
        with BuildLine():
            Line((28, -30), (13.179811187, -30))
            Line((13.179811187, -30), (13.179811187, -31))
            Line((13.179811187, -31), (39, -31))
            Line((39, -31), (39, -14))
            Line((39, -14), (13, -14))
            Line((13, -14), (13, -15))
            Line((13, -15), (28, -15))
            ThreePointArc((28, -15), (35.5, -22.5), (28, -30))
        make_face()
    extrude(amount=SYLINDERFESTE_LITEN_SYLINDER_DEPTH + SYLINDERFESTE_LITEN_SYLINDER_DEPTH_BACK, mode=Mode.SUBTRACT)

    # Sketch49 → Boss-Extrude11 (add)
    with BuildSketch(Plane.ZY.offset(12.5)):
        Polygon((28, -35), (13, -10), (13, -19.718253158), (22.169048105, -35), align=None)
    extrude(amount=-BOSS_EXTRUDE11_DEPTH)

    # Sketch50 → Boss-Extrude12 (add)
    with BuildSketch(Plane(origin=(12.5, 0, 0), x_dir=(0, 0, -1), z_dir=(1, 0, 0))):
        Polygon((-28, -35), (-22.169048105, -35), (-13, -19.718253158), (-13, -10), align=None)
    extrude(amount=-BOSS_EXTRUDE12_DEPTH)

    # Sketch51 → TIL ASSEMBLY - SLETT FØR PRINTING (add)
    with BuildSketch(Plane.XZ.offset(-10)):
        with Locations(Location((0, 0, 0), (0, 0, 270))):
            Circle(SKETCH51_R)
    extrude(amount=TIL_ASSEMBLY_SLETT_F_R_PRINTING_DEPTH)


solid = part.part
